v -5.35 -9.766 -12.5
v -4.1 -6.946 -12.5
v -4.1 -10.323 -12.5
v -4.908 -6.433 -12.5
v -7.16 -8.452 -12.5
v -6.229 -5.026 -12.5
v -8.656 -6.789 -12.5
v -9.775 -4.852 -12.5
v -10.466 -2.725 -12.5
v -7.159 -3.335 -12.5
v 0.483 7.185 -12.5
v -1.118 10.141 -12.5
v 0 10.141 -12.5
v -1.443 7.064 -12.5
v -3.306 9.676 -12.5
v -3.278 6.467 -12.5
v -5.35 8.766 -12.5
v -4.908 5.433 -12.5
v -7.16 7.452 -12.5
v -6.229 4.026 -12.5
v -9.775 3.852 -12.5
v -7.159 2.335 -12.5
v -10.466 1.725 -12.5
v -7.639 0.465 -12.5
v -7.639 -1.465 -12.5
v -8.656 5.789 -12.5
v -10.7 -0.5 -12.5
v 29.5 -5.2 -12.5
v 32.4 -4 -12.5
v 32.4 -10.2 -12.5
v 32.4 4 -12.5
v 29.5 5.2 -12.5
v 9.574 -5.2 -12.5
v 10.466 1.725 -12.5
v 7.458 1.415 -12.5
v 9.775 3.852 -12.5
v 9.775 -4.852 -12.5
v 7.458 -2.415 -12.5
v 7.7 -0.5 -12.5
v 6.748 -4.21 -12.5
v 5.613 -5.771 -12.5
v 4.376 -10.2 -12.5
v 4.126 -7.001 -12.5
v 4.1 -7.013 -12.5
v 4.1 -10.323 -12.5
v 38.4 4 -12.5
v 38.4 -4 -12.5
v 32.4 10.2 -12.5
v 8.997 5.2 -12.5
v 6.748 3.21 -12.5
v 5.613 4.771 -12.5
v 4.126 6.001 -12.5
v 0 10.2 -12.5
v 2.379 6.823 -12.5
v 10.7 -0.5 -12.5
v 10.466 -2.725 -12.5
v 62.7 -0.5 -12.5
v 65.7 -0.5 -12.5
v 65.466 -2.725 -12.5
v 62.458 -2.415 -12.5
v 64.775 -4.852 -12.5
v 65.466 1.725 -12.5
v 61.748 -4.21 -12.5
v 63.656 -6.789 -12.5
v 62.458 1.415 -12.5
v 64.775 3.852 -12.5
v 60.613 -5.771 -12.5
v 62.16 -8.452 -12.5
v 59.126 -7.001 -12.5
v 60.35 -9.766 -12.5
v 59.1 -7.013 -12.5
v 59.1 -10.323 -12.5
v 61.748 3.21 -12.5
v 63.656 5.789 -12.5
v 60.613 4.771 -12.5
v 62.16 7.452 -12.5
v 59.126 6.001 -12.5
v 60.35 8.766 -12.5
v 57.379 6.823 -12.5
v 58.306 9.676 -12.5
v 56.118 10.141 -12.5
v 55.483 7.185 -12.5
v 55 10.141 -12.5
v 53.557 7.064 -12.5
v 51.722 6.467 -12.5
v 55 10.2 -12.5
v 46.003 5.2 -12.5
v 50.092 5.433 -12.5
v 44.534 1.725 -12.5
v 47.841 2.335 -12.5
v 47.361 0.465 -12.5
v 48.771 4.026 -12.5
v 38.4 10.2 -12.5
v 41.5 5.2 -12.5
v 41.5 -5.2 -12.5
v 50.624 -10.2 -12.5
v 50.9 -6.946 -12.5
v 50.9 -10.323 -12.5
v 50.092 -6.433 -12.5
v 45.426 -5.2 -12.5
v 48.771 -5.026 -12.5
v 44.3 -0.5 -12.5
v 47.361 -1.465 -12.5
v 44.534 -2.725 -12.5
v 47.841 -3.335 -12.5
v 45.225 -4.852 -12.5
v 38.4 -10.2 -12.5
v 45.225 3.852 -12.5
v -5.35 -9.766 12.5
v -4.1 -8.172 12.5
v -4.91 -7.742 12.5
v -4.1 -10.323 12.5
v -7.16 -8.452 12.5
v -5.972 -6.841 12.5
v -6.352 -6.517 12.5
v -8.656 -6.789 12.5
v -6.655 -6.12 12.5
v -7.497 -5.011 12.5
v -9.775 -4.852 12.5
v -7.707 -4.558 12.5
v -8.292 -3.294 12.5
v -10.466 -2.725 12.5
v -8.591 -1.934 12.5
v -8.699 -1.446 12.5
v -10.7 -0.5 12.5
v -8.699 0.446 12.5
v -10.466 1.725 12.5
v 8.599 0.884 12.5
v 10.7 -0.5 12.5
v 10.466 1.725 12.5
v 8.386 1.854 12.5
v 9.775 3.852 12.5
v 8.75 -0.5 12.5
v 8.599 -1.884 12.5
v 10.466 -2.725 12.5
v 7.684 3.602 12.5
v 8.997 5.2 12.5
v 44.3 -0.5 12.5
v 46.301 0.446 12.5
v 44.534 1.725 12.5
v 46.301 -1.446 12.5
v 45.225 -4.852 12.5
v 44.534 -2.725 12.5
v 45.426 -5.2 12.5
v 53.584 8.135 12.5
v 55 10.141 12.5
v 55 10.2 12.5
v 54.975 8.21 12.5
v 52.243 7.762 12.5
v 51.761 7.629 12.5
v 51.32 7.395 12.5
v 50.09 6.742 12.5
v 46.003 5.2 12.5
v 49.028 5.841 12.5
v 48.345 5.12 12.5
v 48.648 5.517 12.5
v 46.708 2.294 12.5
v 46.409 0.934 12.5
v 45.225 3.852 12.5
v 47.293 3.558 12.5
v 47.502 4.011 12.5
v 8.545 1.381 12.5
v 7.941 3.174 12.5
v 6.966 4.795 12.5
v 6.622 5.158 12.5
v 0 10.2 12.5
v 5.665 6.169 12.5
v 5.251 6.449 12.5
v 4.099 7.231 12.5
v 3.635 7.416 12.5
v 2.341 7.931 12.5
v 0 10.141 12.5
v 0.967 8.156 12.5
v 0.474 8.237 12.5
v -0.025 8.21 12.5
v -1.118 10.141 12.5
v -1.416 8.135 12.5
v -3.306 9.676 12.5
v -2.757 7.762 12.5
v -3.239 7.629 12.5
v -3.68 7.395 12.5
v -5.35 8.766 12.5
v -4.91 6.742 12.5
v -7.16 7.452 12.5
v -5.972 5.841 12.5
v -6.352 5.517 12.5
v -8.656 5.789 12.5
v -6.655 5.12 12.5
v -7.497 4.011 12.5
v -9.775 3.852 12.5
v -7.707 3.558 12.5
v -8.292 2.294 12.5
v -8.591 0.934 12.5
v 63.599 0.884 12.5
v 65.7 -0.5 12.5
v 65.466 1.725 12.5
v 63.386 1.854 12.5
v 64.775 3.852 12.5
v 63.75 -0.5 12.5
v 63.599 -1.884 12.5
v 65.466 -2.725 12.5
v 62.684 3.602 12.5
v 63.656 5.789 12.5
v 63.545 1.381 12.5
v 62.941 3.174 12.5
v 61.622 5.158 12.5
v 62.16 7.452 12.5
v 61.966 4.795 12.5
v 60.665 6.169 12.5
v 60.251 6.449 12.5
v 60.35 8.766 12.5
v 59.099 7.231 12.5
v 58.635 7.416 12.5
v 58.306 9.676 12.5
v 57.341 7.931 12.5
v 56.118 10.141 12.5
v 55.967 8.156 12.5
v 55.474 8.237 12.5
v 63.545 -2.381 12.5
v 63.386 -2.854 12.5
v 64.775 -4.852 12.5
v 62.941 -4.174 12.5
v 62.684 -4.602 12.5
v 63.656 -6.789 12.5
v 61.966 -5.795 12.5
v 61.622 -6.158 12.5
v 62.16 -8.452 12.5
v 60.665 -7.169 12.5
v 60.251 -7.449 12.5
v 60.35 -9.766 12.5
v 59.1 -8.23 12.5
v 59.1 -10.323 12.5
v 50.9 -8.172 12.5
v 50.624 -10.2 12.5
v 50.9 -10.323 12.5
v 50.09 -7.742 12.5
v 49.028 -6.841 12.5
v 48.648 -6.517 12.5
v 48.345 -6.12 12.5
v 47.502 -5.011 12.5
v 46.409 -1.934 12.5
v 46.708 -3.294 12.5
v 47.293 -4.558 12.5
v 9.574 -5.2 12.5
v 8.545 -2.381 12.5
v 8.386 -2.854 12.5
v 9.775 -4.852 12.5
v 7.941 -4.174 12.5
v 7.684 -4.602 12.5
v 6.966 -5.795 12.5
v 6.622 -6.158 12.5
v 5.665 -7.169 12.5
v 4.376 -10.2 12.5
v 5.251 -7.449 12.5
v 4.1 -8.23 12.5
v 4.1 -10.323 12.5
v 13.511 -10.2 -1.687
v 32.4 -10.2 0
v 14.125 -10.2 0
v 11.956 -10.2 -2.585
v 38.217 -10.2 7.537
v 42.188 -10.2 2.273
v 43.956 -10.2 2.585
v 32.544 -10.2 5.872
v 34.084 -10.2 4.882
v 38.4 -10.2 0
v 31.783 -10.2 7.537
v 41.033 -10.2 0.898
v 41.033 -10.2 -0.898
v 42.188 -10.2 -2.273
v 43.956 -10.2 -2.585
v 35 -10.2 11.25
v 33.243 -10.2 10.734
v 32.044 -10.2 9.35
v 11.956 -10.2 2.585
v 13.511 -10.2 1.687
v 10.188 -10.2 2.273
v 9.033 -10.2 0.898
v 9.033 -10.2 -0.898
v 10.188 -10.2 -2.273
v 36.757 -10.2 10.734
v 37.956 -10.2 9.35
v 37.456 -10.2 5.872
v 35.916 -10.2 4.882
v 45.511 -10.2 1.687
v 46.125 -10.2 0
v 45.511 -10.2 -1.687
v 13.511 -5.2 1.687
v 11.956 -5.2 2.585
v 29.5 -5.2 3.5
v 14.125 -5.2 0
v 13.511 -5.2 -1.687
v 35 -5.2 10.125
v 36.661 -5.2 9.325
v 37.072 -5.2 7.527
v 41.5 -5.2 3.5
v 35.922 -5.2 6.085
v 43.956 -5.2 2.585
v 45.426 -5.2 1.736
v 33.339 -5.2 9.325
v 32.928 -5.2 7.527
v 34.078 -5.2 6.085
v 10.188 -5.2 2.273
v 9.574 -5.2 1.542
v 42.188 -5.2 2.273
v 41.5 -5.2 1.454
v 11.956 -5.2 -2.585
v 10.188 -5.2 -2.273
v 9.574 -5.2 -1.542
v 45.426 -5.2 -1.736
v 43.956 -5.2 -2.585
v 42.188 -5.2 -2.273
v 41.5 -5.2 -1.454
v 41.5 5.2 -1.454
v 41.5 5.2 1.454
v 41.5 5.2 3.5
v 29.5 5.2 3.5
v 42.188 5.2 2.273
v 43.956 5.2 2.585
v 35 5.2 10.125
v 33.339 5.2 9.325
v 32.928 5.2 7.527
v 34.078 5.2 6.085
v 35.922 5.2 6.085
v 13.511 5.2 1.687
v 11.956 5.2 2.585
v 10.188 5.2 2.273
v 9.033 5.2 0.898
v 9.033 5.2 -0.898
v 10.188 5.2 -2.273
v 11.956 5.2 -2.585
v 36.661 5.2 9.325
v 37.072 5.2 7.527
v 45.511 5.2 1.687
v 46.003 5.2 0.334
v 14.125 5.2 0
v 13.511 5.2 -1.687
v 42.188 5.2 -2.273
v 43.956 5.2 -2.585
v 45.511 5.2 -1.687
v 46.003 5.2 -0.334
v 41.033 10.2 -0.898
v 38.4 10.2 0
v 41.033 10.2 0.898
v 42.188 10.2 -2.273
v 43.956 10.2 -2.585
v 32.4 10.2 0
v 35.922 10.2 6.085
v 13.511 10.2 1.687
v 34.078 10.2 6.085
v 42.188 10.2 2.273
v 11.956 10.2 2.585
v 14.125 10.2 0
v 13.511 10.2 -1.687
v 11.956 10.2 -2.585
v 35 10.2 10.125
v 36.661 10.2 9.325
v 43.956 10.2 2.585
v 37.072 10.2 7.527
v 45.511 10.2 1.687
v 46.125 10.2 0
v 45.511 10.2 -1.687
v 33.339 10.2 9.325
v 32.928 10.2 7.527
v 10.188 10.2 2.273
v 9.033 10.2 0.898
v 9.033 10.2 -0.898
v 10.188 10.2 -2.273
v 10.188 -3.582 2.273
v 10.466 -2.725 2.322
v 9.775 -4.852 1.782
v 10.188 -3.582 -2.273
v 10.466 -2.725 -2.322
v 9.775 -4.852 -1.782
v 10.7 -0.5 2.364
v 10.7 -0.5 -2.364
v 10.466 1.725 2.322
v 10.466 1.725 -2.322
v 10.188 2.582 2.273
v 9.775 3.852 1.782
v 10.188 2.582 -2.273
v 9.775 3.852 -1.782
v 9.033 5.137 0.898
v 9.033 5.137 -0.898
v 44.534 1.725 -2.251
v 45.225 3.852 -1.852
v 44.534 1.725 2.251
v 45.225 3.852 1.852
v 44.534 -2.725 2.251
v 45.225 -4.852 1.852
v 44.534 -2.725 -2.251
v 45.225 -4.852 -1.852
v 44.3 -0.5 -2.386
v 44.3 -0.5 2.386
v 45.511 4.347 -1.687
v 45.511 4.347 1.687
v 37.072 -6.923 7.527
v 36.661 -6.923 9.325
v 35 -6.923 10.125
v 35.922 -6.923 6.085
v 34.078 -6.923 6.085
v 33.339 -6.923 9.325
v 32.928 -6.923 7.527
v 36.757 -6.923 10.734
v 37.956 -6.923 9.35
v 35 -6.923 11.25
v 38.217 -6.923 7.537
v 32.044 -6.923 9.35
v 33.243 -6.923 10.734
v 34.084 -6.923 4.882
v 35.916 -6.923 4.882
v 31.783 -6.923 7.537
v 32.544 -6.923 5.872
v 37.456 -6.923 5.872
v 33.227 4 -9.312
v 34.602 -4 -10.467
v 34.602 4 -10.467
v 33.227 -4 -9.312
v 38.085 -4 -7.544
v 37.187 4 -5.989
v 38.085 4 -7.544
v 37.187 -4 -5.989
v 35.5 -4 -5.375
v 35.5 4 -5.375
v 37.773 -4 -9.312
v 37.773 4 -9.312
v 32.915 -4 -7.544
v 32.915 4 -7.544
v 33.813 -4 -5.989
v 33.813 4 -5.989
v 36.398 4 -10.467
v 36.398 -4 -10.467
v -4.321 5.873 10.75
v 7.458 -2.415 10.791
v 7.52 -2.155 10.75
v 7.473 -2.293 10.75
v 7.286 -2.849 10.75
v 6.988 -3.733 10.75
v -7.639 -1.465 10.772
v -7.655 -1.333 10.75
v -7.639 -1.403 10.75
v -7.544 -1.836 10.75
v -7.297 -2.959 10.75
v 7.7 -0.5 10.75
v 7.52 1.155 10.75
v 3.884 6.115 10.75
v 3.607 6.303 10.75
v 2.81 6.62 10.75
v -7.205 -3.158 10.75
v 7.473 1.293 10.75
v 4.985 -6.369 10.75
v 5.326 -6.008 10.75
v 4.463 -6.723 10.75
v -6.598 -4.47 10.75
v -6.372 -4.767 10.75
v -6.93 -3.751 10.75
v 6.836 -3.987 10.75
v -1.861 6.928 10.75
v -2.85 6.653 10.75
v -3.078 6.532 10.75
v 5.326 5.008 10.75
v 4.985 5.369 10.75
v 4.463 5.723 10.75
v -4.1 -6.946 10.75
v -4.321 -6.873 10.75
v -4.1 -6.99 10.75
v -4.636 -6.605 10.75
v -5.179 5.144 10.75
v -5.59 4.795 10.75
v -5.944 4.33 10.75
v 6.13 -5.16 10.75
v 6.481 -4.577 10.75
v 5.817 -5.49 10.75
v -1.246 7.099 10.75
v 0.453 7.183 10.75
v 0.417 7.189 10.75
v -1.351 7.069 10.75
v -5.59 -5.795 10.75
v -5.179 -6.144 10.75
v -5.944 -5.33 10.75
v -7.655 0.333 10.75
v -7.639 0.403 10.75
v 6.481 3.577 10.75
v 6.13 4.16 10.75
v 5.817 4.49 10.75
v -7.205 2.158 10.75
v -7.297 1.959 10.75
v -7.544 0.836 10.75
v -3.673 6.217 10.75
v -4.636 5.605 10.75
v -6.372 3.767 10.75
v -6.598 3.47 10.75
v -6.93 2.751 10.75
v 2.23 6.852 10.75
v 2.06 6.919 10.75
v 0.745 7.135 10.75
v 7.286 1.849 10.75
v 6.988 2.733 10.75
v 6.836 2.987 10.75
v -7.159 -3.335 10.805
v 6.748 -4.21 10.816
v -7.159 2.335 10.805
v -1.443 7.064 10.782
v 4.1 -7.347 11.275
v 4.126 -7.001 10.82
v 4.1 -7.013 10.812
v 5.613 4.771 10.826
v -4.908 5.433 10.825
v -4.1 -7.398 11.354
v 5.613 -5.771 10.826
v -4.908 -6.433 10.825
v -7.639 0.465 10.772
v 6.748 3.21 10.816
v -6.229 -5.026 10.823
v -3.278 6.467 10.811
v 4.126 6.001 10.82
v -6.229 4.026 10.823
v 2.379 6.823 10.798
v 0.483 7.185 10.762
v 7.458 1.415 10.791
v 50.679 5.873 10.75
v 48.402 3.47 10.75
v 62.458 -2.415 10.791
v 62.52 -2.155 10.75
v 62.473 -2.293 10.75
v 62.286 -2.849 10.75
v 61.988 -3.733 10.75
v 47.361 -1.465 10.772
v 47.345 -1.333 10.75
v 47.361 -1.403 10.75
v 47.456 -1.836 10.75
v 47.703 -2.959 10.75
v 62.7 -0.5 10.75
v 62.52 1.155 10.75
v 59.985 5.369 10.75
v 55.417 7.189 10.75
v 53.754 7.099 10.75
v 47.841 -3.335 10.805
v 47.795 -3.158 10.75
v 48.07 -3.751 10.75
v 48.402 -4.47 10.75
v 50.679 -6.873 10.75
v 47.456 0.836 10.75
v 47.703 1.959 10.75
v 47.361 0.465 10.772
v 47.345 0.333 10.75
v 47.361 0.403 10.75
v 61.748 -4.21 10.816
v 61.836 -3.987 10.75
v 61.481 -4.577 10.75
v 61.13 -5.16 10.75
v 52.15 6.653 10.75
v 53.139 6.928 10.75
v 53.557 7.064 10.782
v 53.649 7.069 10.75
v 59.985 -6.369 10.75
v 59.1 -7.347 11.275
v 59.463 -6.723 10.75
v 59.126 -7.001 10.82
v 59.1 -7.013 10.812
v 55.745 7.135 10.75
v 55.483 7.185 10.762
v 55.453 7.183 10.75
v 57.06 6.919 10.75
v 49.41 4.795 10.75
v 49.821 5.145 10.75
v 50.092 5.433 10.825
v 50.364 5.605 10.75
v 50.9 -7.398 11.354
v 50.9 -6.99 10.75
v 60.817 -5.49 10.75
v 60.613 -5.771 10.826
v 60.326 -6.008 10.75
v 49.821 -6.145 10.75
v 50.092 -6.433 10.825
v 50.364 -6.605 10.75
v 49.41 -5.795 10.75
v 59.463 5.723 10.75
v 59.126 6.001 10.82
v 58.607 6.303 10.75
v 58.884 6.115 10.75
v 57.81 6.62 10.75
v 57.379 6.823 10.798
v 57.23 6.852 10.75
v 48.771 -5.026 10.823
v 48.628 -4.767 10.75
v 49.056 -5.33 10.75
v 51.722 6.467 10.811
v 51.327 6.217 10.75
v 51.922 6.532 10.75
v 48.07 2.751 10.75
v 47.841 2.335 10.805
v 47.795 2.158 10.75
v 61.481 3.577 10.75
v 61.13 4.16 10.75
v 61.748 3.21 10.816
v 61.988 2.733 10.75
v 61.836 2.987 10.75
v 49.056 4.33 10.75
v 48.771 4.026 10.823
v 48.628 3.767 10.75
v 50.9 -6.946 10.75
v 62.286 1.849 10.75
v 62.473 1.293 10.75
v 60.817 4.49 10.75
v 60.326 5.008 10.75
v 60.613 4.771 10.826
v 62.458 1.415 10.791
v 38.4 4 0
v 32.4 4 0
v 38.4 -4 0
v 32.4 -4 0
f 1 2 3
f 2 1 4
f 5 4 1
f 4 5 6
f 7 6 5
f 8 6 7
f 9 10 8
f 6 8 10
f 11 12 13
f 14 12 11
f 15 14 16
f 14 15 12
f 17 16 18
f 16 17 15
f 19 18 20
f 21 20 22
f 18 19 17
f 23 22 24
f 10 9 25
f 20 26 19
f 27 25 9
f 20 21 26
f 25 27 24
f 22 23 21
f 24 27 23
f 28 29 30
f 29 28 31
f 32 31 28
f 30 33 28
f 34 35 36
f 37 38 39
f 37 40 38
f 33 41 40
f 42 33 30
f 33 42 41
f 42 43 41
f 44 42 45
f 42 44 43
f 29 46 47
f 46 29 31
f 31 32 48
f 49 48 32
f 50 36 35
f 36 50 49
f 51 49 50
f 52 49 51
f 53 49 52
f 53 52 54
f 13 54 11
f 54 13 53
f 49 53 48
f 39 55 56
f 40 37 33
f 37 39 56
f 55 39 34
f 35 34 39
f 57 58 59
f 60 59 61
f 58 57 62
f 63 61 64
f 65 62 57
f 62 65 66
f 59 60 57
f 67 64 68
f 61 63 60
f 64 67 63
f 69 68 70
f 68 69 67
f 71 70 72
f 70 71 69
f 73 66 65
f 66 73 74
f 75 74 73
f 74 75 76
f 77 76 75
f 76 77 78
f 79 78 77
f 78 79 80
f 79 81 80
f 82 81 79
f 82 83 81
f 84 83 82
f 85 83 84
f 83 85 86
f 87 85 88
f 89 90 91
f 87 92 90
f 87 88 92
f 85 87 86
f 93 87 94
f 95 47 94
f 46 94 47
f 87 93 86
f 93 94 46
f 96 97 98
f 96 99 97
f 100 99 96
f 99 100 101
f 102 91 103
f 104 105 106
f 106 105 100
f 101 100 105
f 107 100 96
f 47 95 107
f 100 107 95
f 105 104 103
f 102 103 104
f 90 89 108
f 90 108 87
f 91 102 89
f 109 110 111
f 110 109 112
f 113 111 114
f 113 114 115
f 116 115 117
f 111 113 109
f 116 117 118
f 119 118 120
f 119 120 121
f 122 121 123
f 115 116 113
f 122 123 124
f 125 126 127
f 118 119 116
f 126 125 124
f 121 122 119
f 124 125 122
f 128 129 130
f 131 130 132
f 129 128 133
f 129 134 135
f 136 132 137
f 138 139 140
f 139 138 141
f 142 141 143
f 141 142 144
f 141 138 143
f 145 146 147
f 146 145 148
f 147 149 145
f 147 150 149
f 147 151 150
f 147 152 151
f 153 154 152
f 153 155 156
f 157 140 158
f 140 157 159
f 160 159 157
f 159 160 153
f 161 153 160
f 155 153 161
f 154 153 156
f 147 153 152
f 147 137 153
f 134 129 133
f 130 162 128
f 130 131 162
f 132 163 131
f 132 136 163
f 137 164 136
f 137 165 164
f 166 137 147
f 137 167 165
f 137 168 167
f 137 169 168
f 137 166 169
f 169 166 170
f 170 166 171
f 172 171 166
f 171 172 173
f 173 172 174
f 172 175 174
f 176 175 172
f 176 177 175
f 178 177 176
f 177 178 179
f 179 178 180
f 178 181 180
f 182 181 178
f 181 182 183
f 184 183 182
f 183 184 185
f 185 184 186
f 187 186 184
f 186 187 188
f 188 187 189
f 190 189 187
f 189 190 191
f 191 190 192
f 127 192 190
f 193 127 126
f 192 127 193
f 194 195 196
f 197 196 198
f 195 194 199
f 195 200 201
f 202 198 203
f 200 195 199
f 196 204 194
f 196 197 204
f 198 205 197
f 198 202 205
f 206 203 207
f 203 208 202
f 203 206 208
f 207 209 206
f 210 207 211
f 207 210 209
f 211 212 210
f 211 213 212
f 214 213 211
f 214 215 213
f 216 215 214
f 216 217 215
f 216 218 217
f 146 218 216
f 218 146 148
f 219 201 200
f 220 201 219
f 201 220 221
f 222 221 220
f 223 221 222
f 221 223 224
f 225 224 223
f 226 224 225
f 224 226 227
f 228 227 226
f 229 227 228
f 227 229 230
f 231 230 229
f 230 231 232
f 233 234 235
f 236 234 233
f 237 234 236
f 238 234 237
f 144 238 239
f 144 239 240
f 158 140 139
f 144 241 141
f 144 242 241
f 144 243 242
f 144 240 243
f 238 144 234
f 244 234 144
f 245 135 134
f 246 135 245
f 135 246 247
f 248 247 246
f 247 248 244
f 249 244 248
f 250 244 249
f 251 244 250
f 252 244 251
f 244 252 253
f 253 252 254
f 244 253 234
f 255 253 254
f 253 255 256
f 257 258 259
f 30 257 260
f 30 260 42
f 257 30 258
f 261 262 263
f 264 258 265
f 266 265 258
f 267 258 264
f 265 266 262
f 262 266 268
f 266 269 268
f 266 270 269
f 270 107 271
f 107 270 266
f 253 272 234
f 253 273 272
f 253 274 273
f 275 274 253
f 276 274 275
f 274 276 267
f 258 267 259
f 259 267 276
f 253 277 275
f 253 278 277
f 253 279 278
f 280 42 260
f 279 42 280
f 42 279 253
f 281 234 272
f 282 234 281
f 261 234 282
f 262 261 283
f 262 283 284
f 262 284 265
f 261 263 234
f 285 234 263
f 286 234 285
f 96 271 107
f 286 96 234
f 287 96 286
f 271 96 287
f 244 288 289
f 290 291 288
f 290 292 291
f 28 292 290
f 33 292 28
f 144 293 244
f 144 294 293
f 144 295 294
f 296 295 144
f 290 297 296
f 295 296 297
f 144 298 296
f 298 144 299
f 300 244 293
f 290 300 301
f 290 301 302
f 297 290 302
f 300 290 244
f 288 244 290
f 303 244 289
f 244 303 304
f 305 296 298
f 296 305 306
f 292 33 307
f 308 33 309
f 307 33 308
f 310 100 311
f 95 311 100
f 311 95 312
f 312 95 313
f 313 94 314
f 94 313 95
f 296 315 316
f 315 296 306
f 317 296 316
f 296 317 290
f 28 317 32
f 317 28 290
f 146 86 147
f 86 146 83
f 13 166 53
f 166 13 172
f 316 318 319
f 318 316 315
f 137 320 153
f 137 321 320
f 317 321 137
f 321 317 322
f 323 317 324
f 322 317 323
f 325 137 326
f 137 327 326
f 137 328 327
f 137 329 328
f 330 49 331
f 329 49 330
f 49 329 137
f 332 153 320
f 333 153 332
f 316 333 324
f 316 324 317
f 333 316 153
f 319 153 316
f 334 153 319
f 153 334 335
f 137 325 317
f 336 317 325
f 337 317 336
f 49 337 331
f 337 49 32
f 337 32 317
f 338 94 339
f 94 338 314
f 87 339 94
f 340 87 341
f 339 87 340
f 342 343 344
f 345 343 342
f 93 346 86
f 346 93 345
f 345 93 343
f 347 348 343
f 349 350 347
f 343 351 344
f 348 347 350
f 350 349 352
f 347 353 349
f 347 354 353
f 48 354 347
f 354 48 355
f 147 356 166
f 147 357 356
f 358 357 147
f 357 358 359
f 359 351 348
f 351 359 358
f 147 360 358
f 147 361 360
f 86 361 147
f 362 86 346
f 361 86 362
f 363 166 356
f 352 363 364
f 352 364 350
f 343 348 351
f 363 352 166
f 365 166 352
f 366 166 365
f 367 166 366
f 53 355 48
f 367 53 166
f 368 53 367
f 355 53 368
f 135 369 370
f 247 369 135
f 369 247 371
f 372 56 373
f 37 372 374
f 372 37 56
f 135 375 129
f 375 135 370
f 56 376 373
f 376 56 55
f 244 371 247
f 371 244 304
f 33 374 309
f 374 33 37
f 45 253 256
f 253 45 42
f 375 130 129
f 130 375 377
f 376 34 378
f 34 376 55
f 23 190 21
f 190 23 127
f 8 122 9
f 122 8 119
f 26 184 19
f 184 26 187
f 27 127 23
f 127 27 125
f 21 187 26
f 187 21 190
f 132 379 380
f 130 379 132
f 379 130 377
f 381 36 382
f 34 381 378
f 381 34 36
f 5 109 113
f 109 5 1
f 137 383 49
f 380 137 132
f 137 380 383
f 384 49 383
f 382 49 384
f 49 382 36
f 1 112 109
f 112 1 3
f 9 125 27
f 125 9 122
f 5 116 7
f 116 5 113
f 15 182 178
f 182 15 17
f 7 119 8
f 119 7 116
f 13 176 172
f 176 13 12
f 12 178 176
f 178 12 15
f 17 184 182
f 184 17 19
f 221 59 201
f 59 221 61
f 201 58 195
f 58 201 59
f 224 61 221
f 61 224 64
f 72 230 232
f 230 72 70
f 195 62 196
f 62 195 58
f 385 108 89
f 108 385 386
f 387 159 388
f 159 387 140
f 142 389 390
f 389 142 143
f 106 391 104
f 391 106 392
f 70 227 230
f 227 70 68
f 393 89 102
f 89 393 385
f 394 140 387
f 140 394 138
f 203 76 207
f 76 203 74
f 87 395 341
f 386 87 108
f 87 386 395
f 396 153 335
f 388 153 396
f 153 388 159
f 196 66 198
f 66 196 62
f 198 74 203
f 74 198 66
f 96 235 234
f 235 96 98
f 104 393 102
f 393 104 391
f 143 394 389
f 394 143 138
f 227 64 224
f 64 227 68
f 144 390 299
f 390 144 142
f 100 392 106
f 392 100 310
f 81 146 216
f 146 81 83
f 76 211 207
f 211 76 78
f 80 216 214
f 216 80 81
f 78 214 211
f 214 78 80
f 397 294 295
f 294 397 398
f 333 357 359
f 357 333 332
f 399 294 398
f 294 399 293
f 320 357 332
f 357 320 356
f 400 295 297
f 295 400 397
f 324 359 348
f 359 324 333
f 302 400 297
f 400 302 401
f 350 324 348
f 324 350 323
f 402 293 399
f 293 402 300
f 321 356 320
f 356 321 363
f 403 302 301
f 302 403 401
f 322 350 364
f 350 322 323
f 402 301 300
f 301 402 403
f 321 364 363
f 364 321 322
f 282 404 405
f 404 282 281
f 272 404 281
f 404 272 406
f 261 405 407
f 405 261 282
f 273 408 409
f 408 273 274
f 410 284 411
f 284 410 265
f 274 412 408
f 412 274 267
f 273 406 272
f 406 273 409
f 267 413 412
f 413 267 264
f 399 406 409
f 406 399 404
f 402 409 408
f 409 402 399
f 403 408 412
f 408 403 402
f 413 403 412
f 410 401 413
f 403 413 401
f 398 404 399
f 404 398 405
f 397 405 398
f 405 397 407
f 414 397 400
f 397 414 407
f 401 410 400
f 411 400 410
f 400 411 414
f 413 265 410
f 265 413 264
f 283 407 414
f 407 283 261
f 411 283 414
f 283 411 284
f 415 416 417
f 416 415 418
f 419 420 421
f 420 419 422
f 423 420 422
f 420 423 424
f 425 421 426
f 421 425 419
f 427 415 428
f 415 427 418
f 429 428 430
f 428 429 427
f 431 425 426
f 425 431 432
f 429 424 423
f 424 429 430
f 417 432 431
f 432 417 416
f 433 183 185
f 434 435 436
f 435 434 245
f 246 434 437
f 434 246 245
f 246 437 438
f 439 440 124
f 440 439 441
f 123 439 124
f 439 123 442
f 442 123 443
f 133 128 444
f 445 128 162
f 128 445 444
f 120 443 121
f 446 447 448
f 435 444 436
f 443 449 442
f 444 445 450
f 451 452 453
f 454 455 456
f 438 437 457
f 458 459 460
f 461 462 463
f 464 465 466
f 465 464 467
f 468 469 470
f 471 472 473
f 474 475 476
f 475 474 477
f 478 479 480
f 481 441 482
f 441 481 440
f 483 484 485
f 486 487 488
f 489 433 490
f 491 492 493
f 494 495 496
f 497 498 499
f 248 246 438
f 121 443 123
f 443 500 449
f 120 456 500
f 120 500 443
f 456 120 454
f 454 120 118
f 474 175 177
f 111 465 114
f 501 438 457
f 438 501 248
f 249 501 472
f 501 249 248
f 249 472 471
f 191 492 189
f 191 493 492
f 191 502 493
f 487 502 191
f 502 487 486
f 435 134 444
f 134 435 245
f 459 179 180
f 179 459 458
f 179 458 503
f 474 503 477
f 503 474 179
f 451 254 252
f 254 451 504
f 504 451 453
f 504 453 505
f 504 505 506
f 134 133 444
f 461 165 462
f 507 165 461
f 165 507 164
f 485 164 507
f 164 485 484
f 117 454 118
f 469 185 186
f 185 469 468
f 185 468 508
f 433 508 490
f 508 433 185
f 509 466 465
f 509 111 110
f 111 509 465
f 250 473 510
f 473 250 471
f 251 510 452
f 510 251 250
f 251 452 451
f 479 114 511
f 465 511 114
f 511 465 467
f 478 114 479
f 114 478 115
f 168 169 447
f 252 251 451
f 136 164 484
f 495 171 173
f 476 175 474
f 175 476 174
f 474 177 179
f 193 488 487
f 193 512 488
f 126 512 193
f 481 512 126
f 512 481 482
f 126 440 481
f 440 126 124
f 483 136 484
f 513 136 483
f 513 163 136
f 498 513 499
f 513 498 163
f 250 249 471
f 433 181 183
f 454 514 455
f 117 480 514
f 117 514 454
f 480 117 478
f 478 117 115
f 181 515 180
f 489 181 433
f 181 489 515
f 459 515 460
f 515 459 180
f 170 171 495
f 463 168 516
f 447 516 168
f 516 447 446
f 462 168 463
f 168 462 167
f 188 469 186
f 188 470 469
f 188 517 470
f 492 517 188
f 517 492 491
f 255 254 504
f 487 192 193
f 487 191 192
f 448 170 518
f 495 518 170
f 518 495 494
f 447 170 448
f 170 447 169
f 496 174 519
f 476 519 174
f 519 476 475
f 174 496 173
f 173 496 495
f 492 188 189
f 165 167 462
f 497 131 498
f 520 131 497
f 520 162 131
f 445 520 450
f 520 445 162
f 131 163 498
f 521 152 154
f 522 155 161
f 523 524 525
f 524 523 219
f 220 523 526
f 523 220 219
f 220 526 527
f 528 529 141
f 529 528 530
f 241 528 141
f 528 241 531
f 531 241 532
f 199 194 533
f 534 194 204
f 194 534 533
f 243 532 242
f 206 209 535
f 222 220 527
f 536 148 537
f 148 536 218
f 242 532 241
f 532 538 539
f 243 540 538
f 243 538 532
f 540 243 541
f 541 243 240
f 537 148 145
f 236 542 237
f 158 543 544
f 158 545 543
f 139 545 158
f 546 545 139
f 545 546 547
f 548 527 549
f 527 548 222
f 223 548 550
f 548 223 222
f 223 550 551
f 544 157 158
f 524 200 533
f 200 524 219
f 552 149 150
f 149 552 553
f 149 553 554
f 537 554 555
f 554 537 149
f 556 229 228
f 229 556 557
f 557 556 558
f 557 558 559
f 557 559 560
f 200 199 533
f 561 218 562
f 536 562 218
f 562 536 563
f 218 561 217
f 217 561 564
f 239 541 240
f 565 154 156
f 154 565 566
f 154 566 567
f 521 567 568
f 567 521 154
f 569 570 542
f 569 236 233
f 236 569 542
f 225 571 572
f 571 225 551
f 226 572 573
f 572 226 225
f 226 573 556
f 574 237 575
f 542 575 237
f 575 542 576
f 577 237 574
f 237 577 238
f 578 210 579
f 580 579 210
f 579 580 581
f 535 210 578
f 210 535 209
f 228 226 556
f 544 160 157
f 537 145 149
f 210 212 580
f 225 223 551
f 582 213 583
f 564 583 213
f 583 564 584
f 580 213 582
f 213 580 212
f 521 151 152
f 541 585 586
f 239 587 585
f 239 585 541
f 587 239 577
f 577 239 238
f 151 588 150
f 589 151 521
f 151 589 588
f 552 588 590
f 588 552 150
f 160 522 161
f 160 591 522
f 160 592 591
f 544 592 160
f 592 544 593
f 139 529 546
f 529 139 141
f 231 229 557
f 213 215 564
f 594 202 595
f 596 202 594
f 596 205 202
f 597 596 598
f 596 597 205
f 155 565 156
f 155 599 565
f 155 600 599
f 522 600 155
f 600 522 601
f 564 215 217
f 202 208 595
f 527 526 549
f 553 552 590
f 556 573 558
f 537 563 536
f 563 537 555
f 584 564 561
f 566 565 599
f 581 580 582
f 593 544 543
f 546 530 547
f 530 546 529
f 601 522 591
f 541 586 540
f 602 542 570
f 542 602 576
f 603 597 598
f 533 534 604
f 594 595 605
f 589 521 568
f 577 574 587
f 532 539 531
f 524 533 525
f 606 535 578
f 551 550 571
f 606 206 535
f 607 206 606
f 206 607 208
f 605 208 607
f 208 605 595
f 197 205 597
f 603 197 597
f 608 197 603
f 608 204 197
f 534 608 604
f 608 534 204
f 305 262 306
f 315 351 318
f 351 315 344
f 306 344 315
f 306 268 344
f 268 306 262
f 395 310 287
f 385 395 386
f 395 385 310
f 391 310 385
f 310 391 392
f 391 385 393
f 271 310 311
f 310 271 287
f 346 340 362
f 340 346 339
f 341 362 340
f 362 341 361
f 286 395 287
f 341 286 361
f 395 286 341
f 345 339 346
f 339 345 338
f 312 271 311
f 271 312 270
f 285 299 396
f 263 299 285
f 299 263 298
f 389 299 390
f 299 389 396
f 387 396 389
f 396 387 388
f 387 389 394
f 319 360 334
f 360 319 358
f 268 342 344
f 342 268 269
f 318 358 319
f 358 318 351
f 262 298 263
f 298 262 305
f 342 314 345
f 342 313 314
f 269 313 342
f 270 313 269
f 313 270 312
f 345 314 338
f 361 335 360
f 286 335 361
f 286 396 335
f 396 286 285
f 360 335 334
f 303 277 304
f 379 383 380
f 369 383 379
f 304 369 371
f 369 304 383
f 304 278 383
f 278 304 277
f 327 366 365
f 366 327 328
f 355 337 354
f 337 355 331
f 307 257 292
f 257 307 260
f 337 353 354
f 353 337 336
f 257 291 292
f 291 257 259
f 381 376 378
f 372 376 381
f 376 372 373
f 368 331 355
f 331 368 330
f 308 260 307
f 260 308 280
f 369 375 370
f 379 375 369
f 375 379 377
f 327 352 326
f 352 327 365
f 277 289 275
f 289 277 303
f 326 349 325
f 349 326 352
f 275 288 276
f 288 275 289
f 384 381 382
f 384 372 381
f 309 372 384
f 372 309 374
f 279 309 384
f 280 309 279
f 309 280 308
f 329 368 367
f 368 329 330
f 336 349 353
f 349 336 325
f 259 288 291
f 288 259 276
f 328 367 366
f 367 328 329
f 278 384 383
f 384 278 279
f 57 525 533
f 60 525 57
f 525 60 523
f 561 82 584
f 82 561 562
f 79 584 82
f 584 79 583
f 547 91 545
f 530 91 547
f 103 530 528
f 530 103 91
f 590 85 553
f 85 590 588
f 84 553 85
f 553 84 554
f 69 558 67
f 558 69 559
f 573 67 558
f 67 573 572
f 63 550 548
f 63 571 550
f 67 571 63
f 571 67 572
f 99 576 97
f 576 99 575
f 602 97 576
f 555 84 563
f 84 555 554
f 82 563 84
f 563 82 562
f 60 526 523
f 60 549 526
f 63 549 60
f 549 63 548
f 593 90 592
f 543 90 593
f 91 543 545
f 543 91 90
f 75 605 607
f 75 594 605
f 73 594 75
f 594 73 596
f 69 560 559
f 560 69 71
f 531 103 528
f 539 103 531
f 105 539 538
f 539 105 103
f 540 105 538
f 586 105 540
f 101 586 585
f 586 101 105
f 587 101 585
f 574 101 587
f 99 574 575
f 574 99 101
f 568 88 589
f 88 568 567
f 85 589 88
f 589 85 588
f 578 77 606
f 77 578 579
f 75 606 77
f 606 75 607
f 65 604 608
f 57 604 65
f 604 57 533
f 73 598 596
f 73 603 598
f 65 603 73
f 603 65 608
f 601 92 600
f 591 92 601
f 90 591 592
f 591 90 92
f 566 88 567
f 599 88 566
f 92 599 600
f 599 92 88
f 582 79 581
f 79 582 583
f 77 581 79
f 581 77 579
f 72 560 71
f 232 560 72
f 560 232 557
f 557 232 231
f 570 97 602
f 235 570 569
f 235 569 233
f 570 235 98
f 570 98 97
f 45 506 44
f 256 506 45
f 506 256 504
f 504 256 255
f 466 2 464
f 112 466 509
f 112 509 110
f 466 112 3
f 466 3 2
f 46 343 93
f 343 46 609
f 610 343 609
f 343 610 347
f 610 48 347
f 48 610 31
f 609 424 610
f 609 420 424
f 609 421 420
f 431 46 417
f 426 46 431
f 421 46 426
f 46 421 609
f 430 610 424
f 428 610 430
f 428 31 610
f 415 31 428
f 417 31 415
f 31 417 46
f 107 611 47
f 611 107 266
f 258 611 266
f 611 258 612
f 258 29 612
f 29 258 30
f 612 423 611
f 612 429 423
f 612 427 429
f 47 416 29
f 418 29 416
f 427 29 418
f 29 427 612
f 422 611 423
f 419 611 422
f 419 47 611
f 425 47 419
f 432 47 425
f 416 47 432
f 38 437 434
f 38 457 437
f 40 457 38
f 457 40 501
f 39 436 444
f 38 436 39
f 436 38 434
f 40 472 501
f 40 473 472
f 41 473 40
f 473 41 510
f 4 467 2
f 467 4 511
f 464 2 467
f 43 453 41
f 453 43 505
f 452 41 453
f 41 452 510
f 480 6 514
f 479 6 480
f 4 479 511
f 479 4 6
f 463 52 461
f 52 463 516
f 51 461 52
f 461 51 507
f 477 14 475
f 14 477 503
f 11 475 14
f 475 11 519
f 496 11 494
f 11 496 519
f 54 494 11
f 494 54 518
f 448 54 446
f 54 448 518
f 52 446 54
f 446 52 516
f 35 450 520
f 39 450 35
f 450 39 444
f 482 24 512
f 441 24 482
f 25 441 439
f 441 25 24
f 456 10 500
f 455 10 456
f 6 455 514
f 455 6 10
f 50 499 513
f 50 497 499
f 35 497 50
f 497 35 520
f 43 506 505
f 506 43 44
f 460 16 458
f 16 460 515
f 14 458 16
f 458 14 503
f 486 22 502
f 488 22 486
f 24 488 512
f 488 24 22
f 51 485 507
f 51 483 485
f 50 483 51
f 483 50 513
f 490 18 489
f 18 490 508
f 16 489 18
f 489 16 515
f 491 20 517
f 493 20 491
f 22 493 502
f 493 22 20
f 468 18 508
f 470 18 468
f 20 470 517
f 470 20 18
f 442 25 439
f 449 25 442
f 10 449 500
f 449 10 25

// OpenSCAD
// file: Rook_Config.scad
// Rook 3D Printer Configuration
// Created By Jeffrey Olijar 
// Jolijar@gmail.com

// Layer Height
LH = 0.38;

// 608 skate bearing
Bearing_OD = 23; 
Bearing_ID = 8;
Bearing_H = 7;

// M3 Nut Diameter
N3 = 7.5;

// M3 Screw Hole Diameter
M3 = 4.25;

// M4 Screw Hole Diameter
M4 = 5.25;
N4 = 8.75;

// M5 Screw Hole Diameter
M5 = 6;

// M8 Rod Diameter (configure for a tight fit)
M8 = 8.2;

// M8 Nut Diameter
N8 = 15.5;

//LM8UU Bearing
LBD = 15.4; // Diameter
LBH = 25; // Height
LBI = 8;  // Inner Diameter

//Makergear Groovemount
GVO = 16.5; // Outside Diameter
GVI = 12.5;  // Inside Groove Diameter

// Distance Between Centers for X rods
DBCX = 70;
// main file
// Rook 3D Printer 
// X Carriage Holder
// Created By Jeffrey Olijar 
// Jolijar@gmail.com
// Revision 1.02
// 1 x required 

include <Rook_Config.scad> 

module Rook_X_Carriage_Holder(){

DBCX = 55;

rotate(a=[180,0,0]){

difference(){ 

union(){

	translate (v=[DBCX/2,LBD/2,0]){ 
		cube(size =[DBCX,5,25], center = true); 
		}


translate (v=[DBCX/2+8,-2,4.5]){ 
		cube(size =[12,15,16], center = true); 
		}

	translate (v=[DBCX/2,-LBD/2,0]){ 
		cube(size =[DBCX,5,25], center = true); 
		}
translate (v=[0,0.5,0]){
	cylinder(h=25,r=LBD/2+3, center = true);
}
	translate (v=[DBCX,0.5,0]){ 
		cylinder(h=25,r=LBD/2+3, center = true);
}}
union(){
translate (v=[DBCX/2+7.9,-9,6.25]){ 
		cube(size =[6,10,12.5], center = true); 
		}
translate (v=[DBCX/2+7.9,9,6.25]){ 
		cube(size =[6,10,12.5], center = true); 
		}





rotate(a=[90,90,0])translate(v=[0,43,0]){ 

translate(v=[8,-8,-DBCX/4]){
cylinder(h=DBCX/2,r=M3/2);
}
translate(v=[8,-8,-DBCX/3.25]){
cylinder(h=10,r=6.5/2);
}
translate(v=[-8,-7.5,-DBCX/4]){
cylinder(h=DBCX/2,r=M4/2);
}}


rotate(a=[180,0,0]){
// LM8UU Entry Cone 
translate(v=[0,-0.5,12]){ 
cylinder(h=2.5,r1=LBD/2, r2=LBD/2+1.5, center = true);
}
// LM8UU Entry Cone 
translate(v=[DBCX,-0.5,12]){ 
cylinder(h=2.5,r1=LBD/2, r2=LBD/2+1.5, center = true);
}
}


rotate(a=[90,0,0])translate(v=[DBCX/2,0,0]){ 

translate(v=[16,0,-20]){
cylinder(h=50,r=M4/2);
}
translate(v=[-16,0,-20]){
cylinder(h=50,r=M4/2);
}}
translate(v=[0,0.5,0]){
	cylinder(h=25,r=LBD/2, center = true);
}
	translate (v=[0,LBD/2,0]){ 
		cube(size =[M8,M8,25], center = true); 
	translate (v=[DBCX,-LBD/2,0]){ 
translate(v=[0,0.5,0]){
		cylinder(h=25,r=LBD/2, center = true);
}
	translate (v=[0,LBD/2,0]){ 
		cube(size =[M8,M8,25], center = true); 
}}}}}}







}












Rook_X_Carriage_Holder();
